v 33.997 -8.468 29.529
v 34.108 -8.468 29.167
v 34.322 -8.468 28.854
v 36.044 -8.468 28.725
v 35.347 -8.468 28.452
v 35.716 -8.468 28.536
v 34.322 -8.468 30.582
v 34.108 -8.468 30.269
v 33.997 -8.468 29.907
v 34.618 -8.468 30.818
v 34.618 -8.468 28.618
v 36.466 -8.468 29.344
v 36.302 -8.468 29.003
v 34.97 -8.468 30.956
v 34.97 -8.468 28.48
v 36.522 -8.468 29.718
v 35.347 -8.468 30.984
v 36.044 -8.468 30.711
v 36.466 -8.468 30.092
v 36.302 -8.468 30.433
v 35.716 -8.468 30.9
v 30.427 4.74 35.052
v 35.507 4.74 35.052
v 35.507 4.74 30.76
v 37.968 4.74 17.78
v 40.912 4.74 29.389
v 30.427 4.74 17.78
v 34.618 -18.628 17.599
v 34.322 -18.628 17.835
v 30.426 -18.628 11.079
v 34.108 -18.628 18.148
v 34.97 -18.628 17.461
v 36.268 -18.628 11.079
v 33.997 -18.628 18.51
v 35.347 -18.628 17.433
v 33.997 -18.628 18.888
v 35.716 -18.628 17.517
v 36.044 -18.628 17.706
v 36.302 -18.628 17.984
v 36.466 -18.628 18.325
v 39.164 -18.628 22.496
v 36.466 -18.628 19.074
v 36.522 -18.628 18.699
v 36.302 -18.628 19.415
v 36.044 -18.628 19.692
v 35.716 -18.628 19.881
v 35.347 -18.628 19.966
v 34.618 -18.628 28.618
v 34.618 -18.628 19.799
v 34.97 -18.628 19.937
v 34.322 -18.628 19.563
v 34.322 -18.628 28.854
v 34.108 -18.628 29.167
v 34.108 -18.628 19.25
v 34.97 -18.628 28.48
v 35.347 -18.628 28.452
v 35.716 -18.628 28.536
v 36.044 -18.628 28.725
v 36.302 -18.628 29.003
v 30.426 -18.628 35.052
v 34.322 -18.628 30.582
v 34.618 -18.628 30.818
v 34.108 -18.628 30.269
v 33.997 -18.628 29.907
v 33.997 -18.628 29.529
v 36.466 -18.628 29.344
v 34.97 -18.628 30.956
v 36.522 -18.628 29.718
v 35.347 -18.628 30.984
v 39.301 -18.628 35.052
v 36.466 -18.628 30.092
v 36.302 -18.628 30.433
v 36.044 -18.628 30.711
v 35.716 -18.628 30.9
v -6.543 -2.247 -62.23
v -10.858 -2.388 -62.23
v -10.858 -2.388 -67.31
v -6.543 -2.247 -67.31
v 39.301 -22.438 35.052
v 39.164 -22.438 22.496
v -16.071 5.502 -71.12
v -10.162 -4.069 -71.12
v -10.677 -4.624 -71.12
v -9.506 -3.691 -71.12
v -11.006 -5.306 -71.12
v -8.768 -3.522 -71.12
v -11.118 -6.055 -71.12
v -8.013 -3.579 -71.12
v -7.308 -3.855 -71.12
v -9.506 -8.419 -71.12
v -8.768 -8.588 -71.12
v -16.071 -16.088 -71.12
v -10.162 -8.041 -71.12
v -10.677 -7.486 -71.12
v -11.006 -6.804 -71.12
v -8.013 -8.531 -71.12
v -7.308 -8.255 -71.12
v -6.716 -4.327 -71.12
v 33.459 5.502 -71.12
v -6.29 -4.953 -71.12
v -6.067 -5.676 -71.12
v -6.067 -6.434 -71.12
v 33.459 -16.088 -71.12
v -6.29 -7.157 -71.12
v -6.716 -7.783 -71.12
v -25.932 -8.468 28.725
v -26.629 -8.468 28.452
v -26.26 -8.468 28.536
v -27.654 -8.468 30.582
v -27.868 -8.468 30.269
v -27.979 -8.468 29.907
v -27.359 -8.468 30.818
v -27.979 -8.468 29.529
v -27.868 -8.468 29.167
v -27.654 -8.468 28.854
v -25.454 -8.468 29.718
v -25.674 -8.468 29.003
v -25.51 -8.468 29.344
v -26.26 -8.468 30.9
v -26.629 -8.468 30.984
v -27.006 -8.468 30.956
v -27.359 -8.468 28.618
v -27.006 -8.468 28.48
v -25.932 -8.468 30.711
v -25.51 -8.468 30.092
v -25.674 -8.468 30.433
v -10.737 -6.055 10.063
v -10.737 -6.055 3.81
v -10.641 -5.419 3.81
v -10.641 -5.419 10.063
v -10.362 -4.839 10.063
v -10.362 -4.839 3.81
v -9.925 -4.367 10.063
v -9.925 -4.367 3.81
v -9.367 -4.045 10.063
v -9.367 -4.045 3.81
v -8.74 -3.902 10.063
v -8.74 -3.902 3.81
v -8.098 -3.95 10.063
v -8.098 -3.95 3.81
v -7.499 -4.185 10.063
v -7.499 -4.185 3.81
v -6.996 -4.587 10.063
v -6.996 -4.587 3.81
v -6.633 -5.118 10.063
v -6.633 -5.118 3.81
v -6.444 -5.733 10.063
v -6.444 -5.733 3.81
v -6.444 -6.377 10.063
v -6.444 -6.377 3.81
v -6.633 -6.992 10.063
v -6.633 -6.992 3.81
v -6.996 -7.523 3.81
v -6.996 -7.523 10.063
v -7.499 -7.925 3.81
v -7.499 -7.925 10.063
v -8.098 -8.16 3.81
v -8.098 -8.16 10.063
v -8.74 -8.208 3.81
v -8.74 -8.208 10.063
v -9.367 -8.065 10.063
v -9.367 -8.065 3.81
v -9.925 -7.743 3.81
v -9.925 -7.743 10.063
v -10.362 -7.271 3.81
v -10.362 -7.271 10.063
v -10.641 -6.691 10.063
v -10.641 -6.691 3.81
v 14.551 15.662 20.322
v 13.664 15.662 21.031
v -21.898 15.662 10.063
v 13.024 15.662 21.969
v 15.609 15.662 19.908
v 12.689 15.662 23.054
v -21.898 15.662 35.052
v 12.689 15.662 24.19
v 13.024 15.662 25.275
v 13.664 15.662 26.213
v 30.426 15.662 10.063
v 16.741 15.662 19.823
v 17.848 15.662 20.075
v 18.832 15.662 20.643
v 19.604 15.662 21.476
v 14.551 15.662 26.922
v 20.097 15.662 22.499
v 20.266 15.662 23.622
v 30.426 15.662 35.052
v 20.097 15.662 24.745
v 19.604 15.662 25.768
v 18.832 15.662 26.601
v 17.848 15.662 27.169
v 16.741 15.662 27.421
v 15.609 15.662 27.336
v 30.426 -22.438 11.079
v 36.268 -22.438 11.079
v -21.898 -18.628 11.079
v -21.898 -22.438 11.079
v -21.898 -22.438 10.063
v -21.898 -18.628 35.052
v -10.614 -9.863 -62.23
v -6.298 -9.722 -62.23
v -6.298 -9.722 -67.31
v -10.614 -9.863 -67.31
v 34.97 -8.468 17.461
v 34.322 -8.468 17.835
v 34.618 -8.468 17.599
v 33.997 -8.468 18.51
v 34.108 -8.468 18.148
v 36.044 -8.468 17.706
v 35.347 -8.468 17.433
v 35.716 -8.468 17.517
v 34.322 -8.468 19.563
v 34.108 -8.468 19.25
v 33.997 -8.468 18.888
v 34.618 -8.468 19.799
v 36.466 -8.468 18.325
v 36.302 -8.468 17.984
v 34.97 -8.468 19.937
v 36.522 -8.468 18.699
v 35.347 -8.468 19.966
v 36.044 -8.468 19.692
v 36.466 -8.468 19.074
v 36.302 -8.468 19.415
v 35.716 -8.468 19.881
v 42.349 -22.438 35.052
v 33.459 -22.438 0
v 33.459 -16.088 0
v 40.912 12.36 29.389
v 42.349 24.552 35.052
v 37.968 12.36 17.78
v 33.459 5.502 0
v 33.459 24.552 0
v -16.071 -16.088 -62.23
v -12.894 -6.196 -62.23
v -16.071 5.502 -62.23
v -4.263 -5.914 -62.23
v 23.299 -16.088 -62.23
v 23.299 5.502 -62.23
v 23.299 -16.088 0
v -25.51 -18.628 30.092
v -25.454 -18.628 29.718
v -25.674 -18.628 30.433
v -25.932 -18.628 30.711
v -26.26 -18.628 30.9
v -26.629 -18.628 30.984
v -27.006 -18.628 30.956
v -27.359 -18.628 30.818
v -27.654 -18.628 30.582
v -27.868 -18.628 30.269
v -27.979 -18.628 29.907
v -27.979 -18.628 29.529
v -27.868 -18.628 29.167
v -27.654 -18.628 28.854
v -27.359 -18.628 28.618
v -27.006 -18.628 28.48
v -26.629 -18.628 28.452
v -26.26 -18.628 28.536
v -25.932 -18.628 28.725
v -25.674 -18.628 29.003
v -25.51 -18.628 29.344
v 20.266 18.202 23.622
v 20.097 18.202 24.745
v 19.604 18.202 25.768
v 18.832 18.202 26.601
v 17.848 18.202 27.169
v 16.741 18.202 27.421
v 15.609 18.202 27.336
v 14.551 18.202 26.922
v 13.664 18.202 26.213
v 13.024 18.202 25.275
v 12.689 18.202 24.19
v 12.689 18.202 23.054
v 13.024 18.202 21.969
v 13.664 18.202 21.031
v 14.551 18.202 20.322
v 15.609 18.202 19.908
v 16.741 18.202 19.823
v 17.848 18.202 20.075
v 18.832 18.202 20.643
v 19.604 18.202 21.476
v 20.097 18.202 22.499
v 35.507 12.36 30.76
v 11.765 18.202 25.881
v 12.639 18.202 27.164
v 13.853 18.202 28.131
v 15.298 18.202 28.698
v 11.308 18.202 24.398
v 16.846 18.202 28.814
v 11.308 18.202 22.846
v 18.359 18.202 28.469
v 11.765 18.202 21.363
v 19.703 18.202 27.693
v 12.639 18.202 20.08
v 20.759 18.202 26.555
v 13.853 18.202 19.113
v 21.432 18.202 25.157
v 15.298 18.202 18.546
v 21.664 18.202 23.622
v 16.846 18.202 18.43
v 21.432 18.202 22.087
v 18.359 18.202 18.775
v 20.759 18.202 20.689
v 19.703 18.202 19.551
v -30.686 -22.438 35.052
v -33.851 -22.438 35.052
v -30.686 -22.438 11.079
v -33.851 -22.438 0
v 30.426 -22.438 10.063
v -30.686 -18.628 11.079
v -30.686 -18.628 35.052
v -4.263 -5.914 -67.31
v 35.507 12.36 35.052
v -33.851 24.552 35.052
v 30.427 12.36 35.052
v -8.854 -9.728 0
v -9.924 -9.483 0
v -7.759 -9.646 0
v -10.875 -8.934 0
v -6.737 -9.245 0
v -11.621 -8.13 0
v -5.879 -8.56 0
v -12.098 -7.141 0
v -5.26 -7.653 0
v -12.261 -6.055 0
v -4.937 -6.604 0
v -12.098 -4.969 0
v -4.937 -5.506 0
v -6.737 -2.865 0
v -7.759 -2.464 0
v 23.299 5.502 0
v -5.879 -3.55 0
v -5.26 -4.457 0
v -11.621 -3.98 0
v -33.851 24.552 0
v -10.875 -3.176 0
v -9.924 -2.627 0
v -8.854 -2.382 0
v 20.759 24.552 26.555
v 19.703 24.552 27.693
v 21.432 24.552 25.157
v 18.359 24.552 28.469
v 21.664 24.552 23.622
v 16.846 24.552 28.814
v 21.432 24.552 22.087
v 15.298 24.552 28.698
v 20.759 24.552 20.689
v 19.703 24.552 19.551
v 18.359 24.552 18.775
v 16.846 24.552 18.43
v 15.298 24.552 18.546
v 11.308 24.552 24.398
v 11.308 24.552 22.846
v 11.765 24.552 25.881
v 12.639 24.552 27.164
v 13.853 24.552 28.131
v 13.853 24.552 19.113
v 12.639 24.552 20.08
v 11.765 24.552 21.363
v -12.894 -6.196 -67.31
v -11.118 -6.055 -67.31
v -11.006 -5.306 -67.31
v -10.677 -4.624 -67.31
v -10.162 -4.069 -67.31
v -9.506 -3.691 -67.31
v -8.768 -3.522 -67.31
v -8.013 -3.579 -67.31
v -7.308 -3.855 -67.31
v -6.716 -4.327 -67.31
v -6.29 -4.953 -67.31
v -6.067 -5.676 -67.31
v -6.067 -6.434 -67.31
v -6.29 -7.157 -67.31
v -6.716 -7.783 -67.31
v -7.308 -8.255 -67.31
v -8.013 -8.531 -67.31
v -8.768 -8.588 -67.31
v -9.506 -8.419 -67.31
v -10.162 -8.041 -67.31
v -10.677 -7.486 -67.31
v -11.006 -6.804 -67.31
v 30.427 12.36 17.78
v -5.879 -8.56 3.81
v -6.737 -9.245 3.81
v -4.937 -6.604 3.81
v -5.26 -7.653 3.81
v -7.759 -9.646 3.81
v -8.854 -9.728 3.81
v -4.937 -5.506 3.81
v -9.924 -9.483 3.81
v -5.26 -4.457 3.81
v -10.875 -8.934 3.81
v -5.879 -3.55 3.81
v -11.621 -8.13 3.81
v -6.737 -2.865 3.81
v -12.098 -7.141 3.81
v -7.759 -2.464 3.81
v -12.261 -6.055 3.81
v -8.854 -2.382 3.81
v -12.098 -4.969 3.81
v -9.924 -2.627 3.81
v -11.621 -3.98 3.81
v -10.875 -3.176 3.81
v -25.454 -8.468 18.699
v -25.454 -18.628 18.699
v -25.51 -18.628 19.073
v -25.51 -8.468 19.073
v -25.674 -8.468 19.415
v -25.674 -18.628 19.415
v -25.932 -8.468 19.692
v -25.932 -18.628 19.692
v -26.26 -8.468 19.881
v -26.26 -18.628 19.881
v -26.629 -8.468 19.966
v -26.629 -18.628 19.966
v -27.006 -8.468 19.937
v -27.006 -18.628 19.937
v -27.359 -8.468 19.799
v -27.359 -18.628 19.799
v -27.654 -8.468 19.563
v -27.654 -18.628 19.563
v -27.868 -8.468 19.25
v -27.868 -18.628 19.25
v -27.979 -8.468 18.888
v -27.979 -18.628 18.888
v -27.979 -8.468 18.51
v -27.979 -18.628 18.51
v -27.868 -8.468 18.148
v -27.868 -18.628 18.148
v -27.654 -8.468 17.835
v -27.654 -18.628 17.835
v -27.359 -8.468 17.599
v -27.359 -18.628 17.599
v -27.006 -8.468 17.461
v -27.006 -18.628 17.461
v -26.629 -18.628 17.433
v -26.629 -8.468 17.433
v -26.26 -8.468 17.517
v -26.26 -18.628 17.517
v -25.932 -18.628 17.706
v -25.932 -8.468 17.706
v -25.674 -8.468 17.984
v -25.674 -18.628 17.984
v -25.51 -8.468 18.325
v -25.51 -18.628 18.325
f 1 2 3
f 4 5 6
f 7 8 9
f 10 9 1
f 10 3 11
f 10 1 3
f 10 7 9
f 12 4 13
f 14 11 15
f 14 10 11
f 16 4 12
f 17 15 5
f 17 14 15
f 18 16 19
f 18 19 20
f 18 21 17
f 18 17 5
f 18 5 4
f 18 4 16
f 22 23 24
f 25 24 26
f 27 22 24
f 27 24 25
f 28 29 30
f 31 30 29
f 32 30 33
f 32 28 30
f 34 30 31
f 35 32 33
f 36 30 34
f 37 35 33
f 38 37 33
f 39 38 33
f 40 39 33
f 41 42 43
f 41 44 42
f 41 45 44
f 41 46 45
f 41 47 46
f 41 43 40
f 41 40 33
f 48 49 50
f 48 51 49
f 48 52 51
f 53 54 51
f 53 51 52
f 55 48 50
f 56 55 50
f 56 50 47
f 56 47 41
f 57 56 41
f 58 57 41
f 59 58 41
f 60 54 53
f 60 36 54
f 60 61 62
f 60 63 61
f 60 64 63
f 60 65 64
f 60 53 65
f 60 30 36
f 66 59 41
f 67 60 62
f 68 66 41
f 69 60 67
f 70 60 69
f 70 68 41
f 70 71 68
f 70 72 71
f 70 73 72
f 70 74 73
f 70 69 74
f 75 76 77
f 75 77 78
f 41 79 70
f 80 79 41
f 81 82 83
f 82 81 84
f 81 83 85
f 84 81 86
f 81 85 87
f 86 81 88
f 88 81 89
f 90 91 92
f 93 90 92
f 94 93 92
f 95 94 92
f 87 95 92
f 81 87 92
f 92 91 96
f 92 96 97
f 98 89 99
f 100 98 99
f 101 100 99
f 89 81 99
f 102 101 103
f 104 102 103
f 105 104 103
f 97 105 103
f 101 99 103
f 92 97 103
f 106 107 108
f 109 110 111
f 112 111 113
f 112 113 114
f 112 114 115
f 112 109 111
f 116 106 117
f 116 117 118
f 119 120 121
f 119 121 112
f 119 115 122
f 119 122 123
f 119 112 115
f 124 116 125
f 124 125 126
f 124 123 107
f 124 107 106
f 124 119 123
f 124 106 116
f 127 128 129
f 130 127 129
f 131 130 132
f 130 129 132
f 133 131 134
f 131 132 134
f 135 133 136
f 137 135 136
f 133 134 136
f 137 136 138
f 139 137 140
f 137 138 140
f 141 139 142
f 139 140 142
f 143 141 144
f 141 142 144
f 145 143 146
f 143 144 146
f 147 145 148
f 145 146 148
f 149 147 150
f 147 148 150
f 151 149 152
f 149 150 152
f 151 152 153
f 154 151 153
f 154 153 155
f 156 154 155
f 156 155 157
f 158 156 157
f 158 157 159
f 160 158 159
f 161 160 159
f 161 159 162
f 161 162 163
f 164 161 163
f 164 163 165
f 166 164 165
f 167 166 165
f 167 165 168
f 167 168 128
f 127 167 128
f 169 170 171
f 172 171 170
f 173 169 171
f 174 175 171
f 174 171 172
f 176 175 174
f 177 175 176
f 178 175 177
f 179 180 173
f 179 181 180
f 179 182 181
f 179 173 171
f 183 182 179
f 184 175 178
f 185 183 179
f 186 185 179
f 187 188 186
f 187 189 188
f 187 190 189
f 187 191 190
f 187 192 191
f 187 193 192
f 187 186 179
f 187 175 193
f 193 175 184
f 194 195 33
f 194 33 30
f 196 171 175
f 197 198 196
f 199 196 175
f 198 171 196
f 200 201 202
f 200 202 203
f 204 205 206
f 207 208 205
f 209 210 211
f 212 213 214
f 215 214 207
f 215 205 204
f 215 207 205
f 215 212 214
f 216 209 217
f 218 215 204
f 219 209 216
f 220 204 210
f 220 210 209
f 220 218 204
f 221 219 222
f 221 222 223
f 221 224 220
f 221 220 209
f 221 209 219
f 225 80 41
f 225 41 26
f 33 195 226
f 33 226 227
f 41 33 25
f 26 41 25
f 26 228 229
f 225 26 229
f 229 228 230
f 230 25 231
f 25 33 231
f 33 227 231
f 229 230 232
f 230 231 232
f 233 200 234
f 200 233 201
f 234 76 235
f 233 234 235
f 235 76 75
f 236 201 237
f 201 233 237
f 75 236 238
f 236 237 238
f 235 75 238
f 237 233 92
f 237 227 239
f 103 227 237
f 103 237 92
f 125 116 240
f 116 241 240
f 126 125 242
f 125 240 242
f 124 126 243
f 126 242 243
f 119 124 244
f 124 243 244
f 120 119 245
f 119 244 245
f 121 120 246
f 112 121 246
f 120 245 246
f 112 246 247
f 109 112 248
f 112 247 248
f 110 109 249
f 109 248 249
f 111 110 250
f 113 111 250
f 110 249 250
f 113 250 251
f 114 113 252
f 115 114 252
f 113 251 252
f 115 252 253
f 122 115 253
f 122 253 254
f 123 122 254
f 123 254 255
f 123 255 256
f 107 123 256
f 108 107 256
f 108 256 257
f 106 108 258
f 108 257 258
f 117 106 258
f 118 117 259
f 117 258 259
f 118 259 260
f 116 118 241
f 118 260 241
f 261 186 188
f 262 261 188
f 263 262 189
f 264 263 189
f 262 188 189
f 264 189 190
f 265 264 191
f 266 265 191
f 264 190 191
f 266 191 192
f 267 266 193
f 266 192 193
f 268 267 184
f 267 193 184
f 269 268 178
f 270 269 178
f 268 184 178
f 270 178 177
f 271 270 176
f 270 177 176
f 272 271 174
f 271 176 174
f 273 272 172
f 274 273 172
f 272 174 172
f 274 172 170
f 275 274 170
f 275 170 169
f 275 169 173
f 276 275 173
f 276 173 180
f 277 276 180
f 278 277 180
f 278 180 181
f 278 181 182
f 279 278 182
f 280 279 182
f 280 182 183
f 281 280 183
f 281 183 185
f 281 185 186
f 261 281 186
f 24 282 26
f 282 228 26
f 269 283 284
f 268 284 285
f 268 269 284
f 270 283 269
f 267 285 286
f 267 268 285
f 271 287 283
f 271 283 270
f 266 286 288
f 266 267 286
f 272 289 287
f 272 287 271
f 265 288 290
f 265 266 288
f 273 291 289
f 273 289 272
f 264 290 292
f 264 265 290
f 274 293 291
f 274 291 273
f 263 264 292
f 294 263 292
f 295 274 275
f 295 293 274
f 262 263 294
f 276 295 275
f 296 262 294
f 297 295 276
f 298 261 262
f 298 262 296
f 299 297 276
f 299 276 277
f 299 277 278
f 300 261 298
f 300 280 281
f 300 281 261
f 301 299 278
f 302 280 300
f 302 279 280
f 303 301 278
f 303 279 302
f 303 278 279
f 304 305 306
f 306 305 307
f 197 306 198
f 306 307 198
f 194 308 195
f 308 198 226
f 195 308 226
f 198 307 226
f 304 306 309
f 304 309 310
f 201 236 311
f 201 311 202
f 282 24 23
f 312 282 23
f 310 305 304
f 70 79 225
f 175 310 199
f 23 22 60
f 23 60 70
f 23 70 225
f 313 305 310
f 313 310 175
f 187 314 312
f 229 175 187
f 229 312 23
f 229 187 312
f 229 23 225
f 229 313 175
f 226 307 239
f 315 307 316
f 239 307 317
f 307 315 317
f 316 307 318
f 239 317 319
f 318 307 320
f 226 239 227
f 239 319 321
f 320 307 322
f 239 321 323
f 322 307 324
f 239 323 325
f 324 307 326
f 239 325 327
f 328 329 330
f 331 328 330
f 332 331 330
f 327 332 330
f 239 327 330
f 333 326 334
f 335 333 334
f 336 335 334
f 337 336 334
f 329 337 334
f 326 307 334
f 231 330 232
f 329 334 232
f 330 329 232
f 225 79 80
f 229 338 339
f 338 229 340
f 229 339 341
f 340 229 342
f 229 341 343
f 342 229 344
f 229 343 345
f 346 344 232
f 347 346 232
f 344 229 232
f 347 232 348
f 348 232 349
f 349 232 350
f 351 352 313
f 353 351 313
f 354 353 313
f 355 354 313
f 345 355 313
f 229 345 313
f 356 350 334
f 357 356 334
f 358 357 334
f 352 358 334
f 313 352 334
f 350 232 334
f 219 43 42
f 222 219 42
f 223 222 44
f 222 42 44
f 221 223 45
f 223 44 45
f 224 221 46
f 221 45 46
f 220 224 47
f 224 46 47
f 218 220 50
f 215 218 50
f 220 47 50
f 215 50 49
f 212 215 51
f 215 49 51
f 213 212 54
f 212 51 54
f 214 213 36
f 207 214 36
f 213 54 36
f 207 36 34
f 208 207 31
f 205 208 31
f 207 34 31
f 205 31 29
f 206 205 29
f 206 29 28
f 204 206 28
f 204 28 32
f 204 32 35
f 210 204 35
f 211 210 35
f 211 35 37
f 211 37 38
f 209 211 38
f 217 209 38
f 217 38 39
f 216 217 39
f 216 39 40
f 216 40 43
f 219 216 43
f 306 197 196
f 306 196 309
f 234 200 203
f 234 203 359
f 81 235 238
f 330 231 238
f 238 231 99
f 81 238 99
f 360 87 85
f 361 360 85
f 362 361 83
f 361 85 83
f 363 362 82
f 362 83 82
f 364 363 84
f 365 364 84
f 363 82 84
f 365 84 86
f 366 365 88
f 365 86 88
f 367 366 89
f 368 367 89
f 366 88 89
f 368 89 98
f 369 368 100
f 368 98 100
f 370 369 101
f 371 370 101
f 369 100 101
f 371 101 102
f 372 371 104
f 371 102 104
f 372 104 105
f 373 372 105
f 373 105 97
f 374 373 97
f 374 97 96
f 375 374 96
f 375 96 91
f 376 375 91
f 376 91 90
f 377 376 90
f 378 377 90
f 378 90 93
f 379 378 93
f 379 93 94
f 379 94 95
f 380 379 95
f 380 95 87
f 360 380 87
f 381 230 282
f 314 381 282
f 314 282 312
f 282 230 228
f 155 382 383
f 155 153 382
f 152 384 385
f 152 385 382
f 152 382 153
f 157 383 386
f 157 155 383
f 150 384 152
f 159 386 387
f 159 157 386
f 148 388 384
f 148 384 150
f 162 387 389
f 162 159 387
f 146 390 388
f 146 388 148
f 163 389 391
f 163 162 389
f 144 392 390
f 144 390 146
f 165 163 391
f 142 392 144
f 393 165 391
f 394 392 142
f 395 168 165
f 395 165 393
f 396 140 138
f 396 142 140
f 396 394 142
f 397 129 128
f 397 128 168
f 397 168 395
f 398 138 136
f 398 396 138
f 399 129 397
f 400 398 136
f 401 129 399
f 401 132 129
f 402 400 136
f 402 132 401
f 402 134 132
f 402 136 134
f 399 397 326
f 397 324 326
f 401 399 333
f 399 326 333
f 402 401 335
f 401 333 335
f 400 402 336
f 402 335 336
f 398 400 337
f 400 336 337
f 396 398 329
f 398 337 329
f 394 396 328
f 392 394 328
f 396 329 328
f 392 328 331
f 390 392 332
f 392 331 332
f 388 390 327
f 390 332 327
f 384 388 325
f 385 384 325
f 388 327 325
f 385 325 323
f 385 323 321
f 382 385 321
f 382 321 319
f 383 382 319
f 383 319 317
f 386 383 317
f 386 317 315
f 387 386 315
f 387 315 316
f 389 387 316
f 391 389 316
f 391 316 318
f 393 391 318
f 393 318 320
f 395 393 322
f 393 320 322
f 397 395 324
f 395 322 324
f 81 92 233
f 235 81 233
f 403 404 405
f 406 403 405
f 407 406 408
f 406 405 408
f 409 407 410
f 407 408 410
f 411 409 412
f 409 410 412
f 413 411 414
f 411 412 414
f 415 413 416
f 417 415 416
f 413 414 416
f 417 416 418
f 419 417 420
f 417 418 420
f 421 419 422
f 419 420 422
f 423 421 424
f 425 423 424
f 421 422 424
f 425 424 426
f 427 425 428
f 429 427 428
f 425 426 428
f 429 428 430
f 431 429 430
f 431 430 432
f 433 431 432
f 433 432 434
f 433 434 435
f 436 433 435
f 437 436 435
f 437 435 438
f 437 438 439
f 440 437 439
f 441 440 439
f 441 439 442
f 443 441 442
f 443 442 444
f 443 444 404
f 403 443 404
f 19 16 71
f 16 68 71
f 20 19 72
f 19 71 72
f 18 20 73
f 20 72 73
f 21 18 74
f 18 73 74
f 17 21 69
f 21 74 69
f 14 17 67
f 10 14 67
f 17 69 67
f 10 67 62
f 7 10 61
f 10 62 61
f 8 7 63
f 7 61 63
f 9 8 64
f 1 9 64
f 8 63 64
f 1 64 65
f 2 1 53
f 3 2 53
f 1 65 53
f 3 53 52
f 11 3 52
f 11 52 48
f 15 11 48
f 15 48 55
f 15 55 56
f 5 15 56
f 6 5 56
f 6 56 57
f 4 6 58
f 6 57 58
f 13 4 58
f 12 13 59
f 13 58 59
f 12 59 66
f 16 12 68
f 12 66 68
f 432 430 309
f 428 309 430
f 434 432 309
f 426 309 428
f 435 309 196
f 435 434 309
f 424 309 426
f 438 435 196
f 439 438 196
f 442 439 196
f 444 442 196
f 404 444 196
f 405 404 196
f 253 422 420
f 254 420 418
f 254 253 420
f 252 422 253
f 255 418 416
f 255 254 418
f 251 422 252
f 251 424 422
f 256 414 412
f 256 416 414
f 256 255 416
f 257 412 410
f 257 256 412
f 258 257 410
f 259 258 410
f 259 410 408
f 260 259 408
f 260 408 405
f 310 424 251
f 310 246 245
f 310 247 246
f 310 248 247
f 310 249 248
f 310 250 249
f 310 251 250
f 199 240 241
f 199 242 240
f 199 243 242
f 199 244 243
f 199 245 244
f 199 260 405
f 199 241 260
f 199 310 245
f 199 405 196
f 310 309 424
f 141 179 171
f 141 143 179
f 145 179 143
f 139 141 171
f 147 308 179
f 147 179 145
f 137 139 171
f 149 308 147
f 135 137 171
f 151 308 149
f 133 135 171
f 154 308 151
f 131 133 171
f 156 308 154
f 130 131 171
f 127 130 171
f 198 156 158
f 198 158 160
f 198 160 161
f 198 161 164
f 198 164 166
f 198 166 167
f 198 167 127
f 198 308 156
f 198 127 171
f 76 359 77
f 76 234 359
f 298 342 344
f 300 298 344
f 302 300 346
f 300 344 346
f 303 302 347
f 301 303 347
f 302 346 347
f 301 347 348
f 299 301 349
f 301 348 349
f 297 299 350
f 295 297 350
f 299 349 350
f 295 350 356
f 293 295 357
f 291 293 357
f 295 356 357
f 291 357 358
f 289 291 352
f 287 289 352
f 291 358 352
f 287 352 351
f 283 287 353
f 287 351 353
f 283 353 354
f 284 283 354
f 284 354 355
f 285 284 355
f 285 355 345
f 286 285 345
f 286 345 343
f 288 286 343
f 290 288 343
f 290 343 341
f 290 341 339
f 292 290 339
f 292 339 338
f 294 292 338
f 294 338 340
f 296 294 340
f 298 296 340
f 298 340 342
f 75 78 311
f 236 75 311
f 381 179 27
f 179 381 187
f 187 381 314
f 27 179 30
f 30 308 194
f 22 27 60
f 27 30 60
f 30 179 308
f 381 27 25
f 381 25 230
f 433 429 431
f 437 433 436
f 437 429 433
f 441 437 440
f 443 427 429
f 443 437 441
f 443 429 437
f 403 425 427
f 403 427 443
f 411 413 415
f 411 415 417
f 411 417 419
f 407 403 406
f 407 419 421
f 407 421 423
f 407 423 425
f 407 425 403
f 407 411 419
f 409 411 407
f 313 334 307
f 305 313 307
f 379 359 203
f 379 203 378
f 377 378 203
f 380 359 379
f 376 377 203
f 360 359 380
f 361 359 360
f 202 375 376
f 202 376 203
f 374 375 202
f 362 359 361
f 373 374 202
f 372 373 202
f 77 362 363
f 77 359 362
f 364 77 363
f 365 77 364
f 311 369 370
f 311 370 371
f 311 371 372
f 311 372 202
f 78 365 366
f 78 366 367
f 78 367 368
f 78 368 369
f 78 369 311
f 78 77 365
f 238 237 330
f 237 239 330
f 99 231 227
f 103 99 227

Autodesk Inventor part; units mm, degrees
ref_plane "YZ Plane" through (0, 0, 0) normal (1, 0, 0) x (0, 1, 0)
ref_plane "XZ Plane" through (0, 0, 0) normal (0, 1, 0) x (-1, 0, 0)
sketch "Sketch1" plane through (0, 0, 0) normal (0, 0, 1) x (1, 0, 0)
  line L0 (-33.8514, 24.552) -> (33.4586, 24.552)
  line L1 (33.4586, 24.552) -> (33.4586, -22.438)
  line L2 (33.4586, -22.438) -> (-33.8514, -22.438)
  line L3 (-33.8514, -22.438) -> (-33.8514, 24.552)
  line L4 (33.4586, -22.438) -> (33.4586, -16.088)
  line L5 (33.4586, -16.088) -> (23.2986, -16.088)
  line L6 (23.2986, -16.088) -> (23.2986, 5.502)
  line L7 (23.2986, 5.502) -> (33.4586, 5.502)
  point P0 (0, 0)
  dimension "d0" = 67.31
  dimension "d1" = 46.99
  dimension "d10" = 6.35
  dimension "d11" = 10.16
  dimension "d12" = 21.59
ref_plane "Work Plane3" through (-33.8514, -22.438, 0) normal (0, 0, 1) x (0, 1, 0)
ref_plane "Work Plane4" through (-33.8514, -22.438, 35.052) normal (0, 0, 1) x (0, 1, 0)
sketch "Sketch3" plane through (-33.8514, -22.438, 35.052) normal (0, 0, 1) x (0, 1, 0)
  line L0 (0, 0) -> (46.99, 0)
  line L1 (46.99, 0) -> (46.99, -76.2)
  line L2 (46.99, -76.2) -> (0, -76.2)
  line L3 (0, -76.2) -> (0, 0)
  point P0 (22.438, -33.8514)
  dimension "d4" = 46.99
  dimension "d5" = 76.2
loft "Loft1" add profiles "Sketch3", "Sketch1"
sketch "Sketch5" plane through (33.4586, -22.438, 0) normal (0, 0, -1) x (-1, 0, 0)
  line L0 (67.31, 0) -> (67.31, 46.99) projected
  line L1 (-8.89, 0) -> (67.31, 0) projected
  circle A0 centre (42.037, 16.383) radius 3.683
  circle A1 centre (42.037, 16.383) radius 2.159
  point P0 (33.4586, 22.438)
  dimension "d17" = 7.366
  dimension "d20" = 4.318
extrude "Extrusion1" add sketch "Sketch1" against normal blind 71.12 contours L1 L5 L6 L7
extrude "Extrusion4" cut sketch "Sketch5" along normal through all both and the other way through all contours A1
extrude "Extrusion5" cut sketch "Sketch5" against normal blind 3.81 contours A0 | A1
sketch "Sketch7" plane through (23.2986, -16.088, 0) normal (-1, 0, 0) x (0, 0, 1)
  point P0 (0, 16.088)
sketch "Sketch8" plane through (23.2986, -16.088, 0) normal (-1, 0, 0) x (0, 0, 1)
  line L0 (0, 0) -> (-71.12, 0) projected
  line L1 (0, 21.59) -> (-71.12, 21.59) projected
  line L2 (-71.12, 0) -> (-62.23, 0)
  line L3 (-62.23, 0) -> (-62.23, 21.59)
  line L4 (-62.23, 21.59) -> (-71.12, 21.59)
  line L5 (-71.12, 21.59) -> (-71.12, 0)
  point P0 (0, 16.088)
  dimension "d27" = 8.89
extrude "Extrusion6" add sketch "Sketch8" along normal blind 39.37
sketch "Sketch9" plane through (0, 0, -71.12) normal (0, 0, -1) x (-1, 0, 0)
  line L0 (16.0714, 5.502) -> (16.0714, -16.088) projected
  line L1 (-33.4586, -16.088) -> (16.0714, -16.088) projected
  circle A0 centre (8.5784, -6.055) radius 2.54
  point P0 (0, 0)
  dimension "d34" = 5.08
extrude "Extrusion7" cut sketch "Sketch9" against normal blind 39.37
sketch "Sketch10" plane through (-33.8514, -22.438, 35.052) normal (0, -1, 0) x (1, 0, 0)
  line L0 (67.31, -35.052) -> (67.31, -106.172) projected
  line L1 (67.31, -35.052) -> (70.1199, -23.9728)
  line L2 (76.2, 0) -> (67.31, -35.052) projected
  line L3 (70.1199, -23.9728) -> (64.2779, -23.9728)
  line L4 (64.2779, -23.9728) -> (64.2779, -24.9888)
  line L5 (64.2779, -24.9888) -> (11.9539, -24.9888)
  line L6 (11.9539, -24.9888) -> (11.9539, -23.9728)
  line L7 (11.9539, -23.9728) -> (3.1655, -23.9728)
  line L8 (3.1655, -23.9728) -> (3.1655, 0)
  line L9 (0, 0) -> (76.2, 0) projected
  line L10 (76.2, 0) -> (73.0154, -12.5564)
  line L11 (76.2, 0) -> (73.152, 0)
  line L12 (73.152, 0) -> (73.0154, -12.5564)
  line L13 (73.0154, -12.5564) -> (70.1199, -23.9728)
  line L14 (73.152, 0) -> (3.1655, 0)
  line L15 (11.9539, -23.9728) -> (11.9539, 0)
  line L16 (64.2779, -23.9728) -> (64.2779, 0)
  line L17 (11.9539, 0) -> (7.1279, 0)
  circle A0 centre (7.1279, -5.334) radius 1.27
  line L18 (11.9539, -23.9728) -> (7.1279, -23.9728)
  circle A1 centre (7.1279, -16.3528) radius 1.27
  line L19 (73.152, 0) -> (68.326, 0)
  line L20 (64.2779, 0) -> (69.1039, 0)
  circle A2 centre (69.1039, -5.334) radius 1.27
  line L21 (64.2779, -23.9728) -> (69.1039, -23.9728)
  circle A3 centre (69.1039, -16.3528) radius 1.27
  point P0 (33.8514, -35.052)
  point P1 (64.2779, 0)
  point P2 (11.9539, 0)
  dimension "d37" = 11.43
  dimension "d38" = 5.842
  dimension "d39" = 1.016
  dimension "d40" = 52.324
  dimension "d41" = 8.7884
  dimension "d42" = 12.954
  dimension "d43" = 3.048
  dimension "d48" = 4.826
  dimension "d50" = 2.54
  dimension "d52" = 2.54
  dimension "d56" = 4.826
  dimension "d58" = 2.54
  dimension "d59" = 4.826
  dimension "d61" = 2.54
extrude "Extrusion8" cut sketch "Sketch10" against normal blind 38.1 contours L4 L5 L6 L15 L9 L16
extrude "Extrusion9" cut sketch "Sketch10" against normal blind 3.81 contours L2 L3 L16 L9 L12 | L15 L7 L8 L9 | A0 | A1 | A2 | A3
sketch "Sketch15" plane through (-33.8514, -18.628, 35.052) normal (0, -1, 0) x (1, 0, 0)
  line L0 (11.9539, -24.9888) -> (11.9539, 0) projected
  line L1 (11.9539, -23.9729) -> (11.9539, -16.3529)
  line L2 (11.9539, -16.3529) -> (7.1279, -16.3529)
  circle A0 centre (7.1279, -16.3529) radius 1.27
  line L3 (11.9539, 0) -> (64.2779, 0) projected
  line L4 (11.9539, 0) -> (7.1279, 0)
  line L5 (3.1655, 0) -> (11.9539, 0) projected
  circle A1 centre (7.1279, -5.334) radius 1.27
  point P0 (33.8514, -35.052)
  dimension "d64" = 7.62
  dimension "d65" = 4.826
  dimension "d66" = 2.54
  dimension "d70" = 2.54
extrude "Extrusion11" cut sketch "Sketch15" against normal blind 10.16 contours A0
sketch "Sketch14" plane through (-33.8514, -18.628, 35.052) normal (0, -1, 0) x (1, 0, 0)
  point P0 (33.8514, -35.052)
extrude "Extrusion12" cut sketch "Sketch15" against normal blind 10.16 contours A1
sketch "Sketch16" plane through (-33.8514, -18.628, 35.052) normal (0, -1, 0) x (1, 0, 0)
  line L0 (11.9539, 0) -> (64.2779, 0) projected
  line L1 (64.2779, 0) -> (69.1039, 0)
  line L2 (0, 0) -> (76.2, 0) projected
  circle A0 centre (69.1039, -5.334) radius 1.27
  line L3 (64.2779, -23.9728) -> (64.2779, -24.9888) projected
  line L4 (64.2779, -23.9728) -> (69.1039, -23.9728)
  line L5 (70.1199, -23.9728) -> (64.2779, -23.9728) projected
  circle A1 centre (69.1039, -16.3528) radius 1.27
  point P0 (33.8514, -35.052)
  dimension "d73" = 4.826
  dimension "d75" = 2.54
  dimension "d76" = 4.826
  dimension "d78" = 2.54
extrude "Extrusion13" cut sketch "Sketch16" against normal blind 10.16
sketch "Sketch17" plane through (-33.8514, 15.662, 35.052) normal (0, -1, 0) x (1, 0, 0)
  line L0 (64.2779, -23.9728) -> (64.2779, 0) projected
  line L1 (64.2779, 0) -> (50.3079, 0)
  line L2 (11.9539, 0) -> (64.2779, 0) projected
  circle A0 centre (50.3079, -11.43) radius 3.81
  point P0 (33.8514, -35.052)
  dimension "d81" = 13.97
  dimension "d83" = 7.62
extrude "Extrusion14" cut sketch "Sketch17" against normal through all
sketch "Sketch18" plane through (-33.8514, 24.552, 35.052) normal (0, 1, 0) x (1, 0, 0)
  circle A0 centre (50.3079, 11.43) radius 3.81 projected
  circle A1 centre (50.3079, 11.43) radius 5.207
  point P0 (33.8514, 35.052)
  dimension "d86" = 10.414
extrude "Extrusion15" cut sketch "Sketch18" against normal blind 6.35 contours A0 | A1
sketch "Sketch19" plane through (30.4266, -22.438, 10.0632) normal (-1, 0, 0) x (0, 0, 1)
  line L0 (24.9888, 38.1) -> (0, 38.1) projected
  line L1 (24.9888, 38.1) -> (24.9888, 3.81) projected
  line L2 (24.9888, 34.798) -> (7.7168, 34.798)
  line L3 (7.7168, 34.798) -> (7.7168, 27.178)
  line L4 (7.7168, 27.178) -> (24.9888, 27.178)
  point P0 (-10.0632, 22.438)
  dimension "d89" = 3.302
  dimension "d90" = 17.272
  dimension "d91" = 7.62
extrude "Extrusion16" cut sketch "Sketch19" against normal blind 5.08
sketch "Sketch20" plane through (42.3486, -22.438, 35.052) normal (0.9693105, 0, -0.2458396) x (-0.2458396, 0, -0.9693105)
  line L0 (0, 46.99) -> (36.1618, 46.99) projected
  line L1 (0, 46.99) -> (0, 34.798)
  line L2 (0, 46.99) -> (0, 0) projected
  line L3 (0, 34.798) -> (5.842, 34.798) construction
  line L4 (5.842, 34.798) -> (5.842, 27.178)
  line L5 (5.842, 27.178) -> (17.526, 27.178)
  line L6 (17.526, 27.178) -> (17.526, 34.798)
  line L7 (17.526, 34.798) -> (5.842, 34.798)
  point P0 (44.3872, 22.438)
  dimension "d94" = 12.192
  dimension "d98" = 11.684
extrude "Extrusion17" cut sketch "Sketch20" against normal blind 11.938
sketch "Sketch21" plane through (35.5066, -22.438, 10.0632) normal (-1, 0, 0) x (0, 0, 1)
  line L0 (7.7168, 27.178) -> (7.7168, 34.798) projected
  line L1 (7.7168, 34.798) -> (8.6432, 34.798) projected
  line L2 (7.7168, 34.798) -> (8.6432, 34.798)
  line L3 (8.6432, 27.178) -> (8.6432, 34.798) projected
  line L4 (8.6432, 34.798) -> (8.6432, 27.178)
  line L5 (24.9888, 27.178) -> (7.7168, 27.178) projected
  line L6 (8.6432, 27.178) -> (7.7168, 27.178)
  line L7 (7.7168, 27.178) -> (7.7168, 34.798)
  point P0 (-10.0632, 22.438)
extrude "Extrusion18" cut sketch "Sketch21" against normal blind 11.938
sketch "Sketch22" plane through (23.2986, -16.088, -62.23) normal (0, 0, 1) x (1, 0, 0)
  circle A0 centre (-31.877, 10.033) radius 2.54 projected
  line L0 (-29.5969, 6.3661) -> (-33.9126, 6.2249)
  line L1 (-33.9126, 6.2249) -> (-36.1927, 9.8919)
  line L2 (-36.1927, 9.8919) -> (-34.1571, 13.6999)
  line L3 (-34.1571, 13.6999) -> (-29.8414, 13.8411)
  line L4 (-29.8414, 13.8411) -> (-27.5613, 10.1741)
  line L5 (-27.5613, 10.1741) -> (-29.5969, 6.3661)
  point P0 (-23.2986, 16.088)
extrude "Extrusion20" cut sketch "Sketch22" against normal blind 5.08 contours A0 | L0 L1 L2 L3 L4 L5
